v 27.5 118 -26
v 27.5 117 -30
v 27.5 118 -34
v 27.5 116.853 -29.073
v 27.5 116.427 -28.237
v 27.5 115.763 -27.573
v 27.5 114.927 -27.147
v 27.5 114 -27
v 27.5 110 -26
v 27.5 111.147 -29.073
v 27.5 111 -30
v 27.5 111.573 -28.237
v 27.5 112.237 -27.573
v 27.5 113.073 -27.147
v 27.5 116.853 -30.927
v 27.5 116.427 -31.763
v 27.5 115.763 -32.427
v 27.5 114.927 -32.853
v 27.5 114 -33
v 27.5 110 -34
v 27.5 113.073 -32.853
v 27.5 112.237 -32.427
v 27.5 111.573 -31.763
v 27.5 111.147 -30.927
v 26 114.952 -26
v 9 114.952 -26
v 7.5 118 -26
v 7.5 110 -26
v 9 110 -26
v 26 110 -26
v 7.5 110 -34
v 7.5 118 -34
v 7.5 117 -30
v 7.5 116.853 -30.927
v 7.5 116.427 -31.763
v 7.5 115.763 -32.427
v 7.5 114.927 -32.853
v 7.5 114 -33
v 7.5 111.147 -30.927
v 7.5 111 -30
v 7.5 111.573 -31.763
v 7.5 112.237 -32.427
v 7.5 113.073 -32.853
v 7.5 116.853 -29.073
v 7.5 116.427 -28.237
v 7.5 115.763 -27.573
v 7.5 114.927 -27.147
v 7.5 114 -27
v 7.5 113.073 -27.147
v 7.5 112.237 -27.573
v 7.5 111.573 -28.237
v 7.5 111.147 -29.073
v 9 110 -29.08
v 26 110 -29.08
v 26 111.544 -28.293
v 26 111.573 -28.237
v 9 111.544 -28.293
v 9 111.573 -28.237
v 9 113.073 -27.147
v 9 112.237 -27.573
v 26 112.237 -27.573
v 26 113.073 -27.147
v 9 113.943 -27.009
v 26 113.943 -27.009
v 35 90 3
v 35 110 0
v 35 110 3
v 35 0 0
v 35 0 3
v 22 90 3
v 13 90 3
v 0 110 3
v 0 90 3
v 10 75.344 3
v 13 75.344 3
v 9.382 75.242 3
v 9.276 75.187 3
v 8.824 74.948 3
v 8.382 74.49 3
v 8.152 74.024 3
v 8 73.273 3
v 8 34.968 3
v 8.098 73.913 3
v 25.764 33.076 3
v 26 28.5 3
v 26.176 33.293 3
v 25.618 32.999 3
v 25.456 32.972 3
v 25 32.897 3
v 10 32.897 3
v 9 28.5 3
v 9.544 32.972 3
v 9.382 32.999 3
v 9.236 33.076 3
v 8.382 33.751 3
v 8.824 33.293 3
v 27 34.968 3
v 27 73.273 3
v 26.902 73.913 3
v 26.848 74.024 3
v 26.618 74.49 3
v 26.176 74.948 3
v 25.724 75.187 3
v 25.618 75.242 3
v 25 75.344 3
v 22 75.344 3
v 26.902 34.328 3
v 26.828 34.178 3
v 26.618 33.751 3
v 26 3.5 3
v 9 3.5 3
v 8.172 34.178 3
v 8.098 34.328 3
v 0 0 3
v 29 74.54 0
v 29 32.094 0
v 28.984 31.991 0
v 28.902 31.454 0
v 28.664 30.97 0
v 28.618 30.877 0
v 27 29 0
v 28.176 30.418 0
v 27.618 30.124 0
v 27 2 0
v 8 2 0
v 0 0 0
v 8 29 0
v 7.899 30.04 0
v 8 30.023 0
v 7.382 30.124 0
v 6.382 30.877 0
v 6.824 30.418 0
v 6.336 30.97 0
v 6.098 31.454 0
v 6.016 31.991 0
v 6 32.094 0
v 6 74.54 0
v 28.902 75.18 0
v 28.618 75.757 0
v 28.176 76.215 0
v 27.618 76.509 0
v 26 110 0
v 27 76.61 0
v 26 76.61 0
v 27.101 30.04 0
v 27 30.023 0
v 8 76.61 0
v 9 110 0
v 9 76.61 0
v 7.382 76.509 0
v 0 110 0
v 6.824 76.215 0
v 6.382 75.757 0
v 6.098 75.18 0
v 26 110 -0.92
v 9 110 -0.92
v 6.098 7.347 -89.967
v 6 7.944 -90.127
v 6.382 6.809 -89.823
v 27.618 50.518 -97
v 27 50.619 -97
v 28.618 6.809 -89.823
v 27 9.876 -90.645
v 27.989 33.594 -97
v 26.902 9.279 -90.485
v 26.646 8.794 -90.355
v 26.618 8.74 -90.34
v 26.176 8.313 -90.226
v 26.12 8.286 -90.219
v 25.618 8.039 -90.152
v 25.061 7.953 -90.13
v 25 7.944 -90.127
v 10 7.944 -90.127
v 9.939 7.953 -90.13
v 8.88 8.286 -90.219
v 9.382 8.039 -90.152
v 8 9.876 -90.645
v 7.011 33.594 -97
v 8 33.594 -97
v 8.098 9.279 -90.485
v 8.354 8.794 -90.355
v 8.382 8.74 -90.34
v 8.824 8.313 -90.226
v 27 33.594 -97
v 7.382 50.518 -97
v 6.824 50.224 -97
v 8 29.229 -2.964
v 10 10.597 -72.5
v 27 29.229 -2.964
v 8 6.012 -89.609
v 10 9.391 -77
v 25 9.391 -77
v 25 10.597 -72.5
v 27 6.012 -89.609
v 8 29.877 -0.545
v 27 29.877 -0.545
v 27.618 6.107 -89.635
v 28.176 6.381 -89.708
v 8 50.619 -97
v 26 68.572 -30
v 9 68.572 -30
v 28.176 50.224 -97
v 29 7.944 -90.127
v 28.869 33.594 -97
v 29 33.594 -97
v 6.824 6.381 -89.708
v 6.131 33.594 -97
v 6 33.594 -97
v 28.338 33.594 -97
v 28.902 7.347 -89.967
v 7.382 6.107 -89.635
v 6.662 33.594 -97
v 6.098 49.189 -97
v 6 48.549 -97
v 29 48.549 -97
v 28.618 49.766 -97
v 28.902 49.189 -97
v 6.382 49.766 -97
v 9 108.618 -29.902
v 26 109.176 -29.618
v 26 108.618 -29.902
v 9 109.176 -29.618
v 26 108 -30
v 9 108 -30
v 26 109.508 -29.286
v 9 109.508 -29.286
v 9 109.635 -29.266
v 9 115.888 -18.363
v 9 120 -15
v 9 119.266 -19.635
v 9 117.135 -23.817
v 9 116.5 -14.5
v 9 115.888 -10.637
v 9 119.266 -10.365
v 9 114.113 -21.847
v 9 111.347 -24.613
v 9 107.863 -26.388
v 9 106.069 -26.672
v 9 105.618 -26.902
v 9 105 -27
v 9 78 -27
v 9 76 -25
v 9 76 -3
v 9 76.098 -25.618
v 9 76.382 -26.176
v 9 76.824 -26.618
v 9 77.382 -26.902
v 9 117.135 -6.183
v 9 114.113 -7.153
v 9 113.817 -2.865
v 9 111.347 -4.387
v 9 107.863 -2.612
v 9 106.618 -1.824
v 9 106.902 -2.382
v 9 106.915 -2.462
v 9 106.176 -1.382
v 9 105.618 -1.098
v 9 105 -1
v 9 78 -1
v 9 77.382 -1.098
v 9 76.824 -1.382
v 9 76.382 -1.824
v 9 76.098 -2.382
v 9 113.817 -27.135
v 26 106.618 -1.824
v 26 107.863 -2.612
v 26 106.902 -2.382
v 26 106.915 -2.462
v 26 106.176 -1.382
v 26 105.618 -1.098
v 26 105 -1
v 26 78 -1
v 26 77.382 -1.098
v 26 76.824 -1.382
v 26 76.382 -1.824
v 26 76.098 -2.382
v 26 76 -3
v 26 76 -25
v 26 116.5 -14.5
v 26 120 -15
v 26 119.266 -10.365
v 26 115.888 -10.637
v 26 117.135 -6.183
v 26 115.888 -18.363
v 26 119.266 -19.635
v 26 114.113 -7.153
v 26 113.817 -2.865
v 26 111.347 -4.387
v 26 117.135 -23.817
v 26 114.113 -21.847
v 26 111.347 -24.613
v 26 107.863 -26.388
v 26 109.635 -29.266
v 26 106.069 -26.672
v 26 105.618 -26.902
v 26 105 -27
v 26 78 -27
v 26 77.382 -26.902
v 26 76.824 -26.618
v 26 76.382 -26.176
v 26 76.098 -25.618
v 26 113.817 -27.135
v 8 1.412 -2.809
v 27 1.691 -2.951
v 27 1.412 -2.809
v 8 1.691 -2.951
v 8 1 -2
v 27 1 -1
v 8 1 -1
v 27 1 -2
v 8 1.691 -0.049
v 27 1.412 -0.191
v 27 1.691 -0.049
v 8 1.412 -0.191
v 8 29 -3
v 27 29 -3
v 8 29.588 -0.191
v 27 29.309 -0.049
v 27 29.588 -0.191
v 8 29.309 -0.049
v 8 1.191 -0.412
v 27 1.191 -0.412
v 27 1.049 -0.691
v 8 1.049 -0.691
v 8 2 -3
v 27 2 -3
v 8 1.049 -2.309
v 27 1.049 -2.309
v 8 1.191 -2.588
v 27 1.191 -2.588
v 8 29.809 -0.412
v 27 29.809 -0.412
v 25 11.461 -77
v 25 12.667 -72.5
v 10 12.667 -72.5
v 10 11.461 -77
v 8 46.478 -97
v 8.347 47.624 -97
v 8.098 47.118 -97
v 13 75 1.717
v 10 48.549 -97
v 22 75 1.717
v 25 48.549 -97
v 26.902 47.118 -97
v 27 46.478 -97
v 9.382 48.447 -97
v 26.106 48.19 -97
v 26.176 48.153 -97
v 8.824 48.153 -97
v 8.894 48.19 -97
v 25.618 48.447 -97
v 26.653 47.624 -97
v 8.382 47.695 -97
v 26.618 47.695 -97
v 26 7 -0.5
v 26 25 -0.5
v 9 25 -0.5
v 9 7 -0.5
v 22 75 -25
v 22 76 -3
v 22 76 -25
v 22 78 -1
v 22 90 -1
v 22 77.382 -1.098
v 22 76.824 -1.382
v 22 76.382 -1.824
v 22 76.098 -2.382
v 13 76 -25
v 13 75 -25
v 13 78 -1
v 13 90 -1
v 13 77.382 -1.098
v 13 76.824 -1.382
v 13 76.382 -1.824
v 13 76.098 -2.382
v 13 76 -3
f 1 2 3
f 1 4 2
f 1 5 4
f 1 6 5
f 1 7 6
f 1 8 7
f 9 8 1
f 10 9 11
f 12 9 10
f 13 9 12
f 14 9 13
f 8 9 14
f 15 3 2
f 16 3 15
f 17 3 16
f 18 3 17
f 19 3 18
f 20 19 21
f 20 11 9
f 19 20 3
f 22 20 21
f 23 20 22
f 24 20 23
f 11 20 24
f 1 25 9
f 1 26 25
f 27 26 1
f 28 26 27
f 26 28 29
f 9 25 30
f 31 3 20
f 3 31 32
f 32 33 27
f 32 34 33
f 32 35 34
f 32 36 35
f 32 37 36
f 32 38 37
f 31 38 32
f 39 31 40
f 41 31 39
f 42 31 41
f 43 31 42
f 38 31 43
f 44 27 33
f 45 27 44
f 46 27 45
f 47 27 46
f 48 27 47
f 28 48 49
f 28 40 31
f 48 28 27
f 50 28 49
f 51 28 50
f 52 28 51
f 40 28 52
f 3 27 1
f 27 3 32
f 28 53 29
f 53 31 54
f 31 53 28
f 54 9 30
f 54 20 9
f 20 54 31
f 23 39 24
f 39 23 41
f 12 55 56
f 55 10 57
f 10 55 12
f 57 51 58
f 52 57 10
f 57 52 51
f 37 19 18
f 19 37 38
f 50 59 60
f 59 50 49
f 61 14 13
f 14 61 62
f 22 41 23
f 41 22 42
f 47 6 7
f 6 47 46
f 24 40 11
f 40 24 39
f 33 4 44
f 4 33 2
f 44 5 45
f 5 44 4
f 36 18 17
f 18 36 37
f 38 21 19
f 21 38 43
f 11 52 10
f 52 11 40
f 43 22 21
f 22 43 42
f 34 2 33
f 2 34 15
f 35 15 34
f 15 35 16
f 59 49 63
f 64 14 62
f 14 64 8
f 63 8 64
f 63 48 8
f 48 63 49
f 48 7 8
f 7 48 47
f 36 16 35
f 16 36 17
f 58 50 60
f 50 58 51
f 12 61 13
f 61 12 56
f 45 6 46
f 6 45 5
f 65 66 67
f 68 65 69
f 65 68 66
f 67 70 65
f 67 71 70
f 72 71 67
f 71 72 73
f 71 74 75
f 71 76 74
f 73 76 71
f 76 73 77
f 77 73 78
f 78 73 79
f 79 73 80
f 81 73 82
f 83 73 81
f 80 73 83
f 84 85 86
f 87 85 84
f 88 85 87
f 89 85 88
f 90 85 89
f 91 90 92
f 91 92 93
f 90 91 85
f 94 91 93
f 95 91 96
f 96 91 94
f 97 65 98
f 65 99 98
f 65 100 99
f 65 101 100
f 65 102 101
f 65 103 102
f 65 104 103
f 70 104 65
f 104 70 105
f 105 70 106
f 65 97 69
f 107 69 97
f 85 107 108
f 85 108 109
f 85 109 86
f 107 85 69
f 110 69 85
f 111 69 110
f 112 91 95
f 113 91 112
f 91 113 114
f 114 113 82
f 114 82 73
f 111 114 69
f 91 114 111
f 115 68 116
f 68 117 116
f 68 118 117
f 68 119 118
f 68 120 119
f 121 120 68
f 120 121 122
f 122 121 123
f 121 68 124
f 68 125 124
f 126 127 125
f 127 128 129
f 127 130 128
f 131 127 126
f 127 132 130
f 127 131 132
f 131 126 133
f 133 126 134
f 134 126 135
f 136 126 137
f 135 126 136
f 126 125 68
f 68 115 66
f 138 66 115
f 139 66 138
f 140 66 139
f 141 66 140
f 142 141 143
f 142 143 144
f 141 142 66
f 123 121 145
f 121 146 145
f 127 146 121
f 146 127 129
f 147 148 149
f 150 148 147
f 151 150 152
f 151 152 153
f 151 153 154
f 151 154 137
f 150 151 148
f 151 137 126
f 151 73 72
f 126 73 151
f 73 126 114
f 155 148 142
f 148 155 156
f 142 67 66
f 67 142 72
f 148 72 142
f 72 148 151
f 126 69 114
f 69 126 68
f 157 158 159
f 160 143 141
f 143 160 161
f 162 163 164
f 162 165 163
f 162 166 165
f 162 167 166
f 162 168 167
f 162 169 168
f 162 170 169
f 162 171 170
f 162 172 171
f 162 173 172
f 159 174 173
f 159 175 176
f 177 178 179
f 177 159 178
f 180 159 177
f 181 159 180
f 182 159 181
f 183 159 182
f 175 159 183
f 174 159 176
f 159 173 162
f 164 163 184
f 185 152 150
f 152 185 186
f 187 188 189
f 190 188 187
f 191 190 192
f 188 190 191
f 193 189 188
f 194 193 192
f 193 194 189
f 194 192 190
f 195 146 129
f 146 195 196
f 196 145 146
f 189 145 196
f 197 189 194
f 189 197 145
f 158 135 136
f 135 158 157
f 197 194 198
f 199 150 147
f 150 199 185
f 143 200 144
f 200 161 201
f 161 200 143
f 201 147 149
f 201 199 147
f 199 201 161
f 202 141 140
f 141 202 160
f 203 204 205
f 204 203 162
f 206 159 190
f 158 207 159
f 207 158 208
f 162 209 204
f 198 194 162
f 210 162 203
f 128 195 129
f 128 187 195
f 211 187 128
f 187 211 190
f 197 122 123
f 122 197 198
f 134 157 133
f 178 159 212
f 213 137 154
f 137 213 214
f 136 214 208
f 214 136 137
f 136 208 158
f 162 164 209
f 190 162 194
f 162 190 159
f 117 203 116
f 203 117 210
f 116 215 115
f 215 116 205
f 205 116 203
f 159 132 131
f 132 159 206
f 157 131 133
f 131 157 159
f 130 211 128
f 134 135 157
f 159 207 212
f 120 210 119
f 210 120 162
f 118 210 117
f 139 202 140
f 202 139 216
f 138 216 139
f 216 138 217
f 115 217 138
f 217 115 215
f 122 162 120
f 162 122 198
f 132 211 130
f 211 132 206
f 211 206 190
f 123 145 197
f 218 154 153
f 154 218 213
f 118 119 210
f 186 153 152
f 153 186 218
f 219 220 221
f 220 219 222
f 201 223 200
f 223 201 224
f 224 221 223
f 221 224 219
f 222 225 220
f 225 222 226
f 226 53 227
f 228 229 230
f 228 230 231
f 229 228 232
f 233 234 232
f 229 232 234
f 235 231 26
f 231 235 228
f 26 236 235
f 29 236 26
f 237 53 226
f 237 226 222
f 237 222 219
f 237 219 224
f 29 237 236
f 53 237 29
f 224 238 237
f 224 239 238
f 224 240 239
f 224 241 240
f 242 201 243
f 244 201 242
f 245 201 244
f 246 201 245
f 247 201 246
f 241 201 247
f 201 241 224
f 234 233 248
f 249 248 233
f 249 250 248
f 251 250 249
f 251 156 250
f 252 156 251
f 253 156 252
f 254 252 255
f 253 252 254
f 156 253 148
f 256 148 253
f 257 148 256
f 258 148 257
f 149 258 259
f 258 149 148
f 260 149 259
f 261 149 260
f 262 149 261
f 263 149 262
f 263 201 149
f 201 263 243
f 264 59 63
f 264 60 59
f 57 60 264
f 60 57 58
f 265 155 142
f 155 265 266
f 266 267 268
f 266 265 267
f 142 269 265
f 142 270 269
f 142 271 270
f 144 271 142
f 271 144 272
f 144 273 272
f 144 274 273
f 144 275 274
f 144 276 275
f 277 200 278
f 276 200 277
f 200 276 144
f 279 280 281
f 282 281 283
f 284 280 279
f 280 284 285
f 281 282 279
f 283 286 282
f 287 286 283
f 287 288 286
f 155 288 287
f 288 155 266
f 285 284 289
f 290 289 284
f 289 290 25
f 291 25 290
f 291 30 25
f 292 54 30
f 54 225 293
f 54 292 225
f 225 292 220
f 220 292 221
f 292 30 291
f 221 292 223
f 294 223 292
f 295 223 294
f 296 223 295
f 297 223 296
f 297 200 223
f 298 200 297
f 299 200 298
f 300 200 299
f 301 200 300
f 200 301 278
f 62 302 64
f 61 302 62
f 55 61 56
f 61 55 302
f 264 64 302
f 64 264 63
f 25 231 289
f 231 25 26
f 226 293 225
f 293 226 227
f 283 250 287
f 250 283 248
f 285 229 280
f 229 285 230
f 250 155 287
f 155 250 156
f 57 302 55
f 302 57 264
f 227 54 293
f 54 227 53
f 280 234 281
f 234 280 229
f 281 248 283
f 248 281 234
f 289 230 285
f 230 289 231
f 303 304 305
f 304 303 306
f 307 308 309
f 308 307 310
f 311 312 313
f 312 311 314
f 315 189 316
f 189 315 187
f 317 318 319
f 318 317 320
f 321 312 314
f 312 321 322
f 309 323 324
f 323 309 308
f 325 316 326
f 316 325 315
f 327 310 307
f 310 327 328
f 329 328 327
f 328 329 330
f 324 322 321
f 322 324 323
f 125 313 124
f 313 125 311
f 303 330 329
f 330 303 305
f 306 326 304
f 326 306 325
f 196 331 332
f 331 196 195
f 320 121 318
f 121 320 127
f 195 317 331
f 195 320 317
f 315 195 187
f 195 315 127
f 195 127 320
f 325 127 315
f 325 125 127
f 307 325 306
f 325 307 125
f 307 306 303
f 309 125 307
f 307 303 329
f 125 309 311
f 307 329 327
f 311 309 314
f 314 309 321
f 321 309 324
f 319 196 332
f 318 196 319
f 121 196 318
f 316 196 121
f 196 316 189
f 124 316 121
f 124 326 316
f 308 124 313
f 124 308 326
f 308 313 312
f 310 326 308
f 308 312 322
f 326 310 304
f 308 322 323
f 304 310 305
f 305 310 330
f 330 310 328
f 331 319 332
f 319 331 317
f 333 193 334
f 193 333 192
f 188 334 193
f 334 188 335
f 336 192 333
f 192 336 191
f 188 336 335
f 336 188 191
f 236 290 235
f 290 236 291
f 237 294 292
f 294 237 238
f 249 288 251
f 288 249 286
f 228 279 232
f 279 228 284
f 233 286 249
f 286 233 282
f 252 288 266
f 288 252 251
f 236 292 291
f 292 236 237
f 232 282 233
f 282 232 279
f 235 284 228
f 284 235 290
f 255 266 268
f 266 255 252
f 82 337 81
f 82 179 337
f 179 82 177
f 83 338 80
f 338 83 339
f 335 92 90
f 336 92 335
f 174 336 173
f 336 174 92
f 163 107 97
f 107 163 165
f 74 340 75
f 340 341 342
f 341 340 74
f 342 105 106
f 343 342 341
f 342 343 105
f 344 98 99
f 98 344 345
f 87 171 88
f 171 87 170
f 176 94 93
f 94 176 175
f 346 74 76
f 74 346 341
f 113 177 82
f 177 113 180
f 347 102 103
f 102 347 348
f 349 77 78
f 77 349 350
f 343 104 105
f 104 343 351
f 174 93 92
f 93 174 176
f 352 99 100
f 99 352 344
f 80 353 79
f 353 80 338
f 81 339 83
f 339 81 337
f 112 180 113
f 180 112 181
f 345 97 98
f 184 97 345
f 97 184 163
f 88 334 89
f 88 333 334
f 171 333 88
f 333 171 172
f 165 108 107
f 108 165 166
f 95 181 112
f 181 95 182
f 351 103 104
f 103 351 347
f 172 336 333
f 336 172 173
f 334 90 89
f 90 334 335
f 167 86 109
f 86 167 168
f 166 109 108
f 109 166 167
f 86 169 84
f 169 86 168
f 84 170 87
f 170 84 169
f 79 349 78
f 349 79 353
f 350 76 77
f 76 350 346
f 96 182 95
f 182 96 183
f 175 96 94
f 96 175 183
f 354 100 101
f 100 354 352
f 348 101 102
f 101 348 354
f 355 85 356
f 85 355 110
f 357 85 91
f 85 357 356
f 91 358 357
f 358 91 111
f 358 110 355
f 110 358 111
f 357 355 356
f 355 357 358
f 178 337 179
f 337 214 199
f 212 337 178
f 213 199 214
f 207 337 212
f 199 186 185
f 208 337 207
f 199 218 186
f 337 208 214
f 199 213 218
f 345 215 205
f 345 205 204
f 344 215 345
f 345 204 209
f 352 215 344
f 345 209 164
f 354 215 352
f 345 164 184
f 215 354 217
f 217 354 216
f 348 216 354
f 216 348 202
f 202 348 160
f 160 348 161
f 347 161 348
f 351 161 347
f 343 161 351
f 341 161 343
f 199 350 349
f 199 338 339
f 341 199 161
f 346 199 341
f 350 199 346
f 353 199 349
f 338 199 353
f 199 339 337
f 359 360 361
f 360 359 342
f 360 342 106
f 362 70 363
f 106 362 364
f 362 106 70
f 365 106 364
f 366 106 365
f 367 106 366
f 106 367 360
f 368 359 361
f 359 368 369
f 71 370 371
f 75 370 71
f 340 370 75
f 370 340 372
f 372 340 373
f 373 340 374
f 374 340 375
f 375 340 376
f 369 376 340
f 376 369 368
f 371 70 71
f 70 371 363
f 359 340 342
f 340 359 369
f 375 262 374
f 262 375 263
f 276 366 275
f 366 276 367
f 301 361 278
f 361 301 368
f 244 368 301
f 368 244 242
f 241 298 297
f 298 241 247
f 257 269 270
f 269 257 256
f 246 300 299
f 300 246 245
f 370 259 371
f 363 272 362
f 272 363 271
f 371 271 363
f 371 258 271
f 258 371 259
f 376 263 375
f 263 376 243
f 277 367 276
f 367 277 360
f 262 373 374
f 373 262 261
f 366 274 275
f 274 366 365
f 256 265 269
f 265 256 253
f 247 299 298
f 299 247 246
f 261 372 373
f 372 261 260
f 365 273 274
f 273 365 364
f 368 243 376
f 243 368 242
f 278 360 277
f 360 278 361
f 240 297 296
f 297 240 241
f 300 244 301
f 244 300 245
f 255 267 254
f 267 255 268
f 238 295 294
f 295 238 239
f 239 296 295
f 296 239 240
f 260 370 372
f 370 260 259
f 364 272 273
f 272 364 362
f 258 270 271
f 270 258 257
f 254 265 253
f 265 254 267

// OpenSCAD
$fn=20;   // For persion of polygons


difference(){
union(){
difference(){ // the period
translate([7.5,110,-34]){ // the period
    cube([20,8,8]);
}
translate([0,114,-30]){
rotate([0,90,0]){
  cylinder(r=3,h=30);
}}}
cube([35,110,3]);  //lower plate.
rotate([-15,0,0]){ // handle.
translate([8,31,-85]){
minkowski(){
  cube([19,41,110]);
  cylinder(r=2,h=1);
}}}
rotate([0,90,0]){ // triggerguard.
translate([0,67,9]){
minkowski(){
  cube([28,41,16]);
  cylinder(r=2,h=1);
}}}
translate([9,105,-15]){ // extra finger space.
rotate([0,90,0]){
  cylinder(r=15,h=17);
}}
rotate([0,90,0]){ // backstrap.
translate([1,2,8]){
minkowski(){
  cube([1,27,18]);
  cylinder(r=1,h=1);
}}}
}


translate([10,-7,-77]){ // clip notch
    cube([15,25,4.5]);
}


translate([7,104,-14.5]){ // extra finger hole
rotate([0,90,0]){
  cylinder(r=12.5,h=22);
}}
rotate([-15,0,0]){  // clip grove
translate([10,33,-100]){
minkowski(){
  cube([15,37,150]);
  cylinder(r=2,h=1);
}}}

hull(){   //  ramp path
translate([-1,2,2.5]){
difference(){   //ramp
translate([10,5,-3]){
rotate([45,0,0]){
    cube([17,5,5]);
}}
translate([9,0,2]){
    cube([20,30,5]);
}}}
translate([-1,20,2.5]){
difference(){   //ramp
translate([10,5,-3]){
rotate([45,0,0]){
    cube([17,5,5]);
}}
translate([9,0,2]){
    cube([20,30,5]);
}}}}

translate([-10,-10,-112]){  // trim handle top
  cube([100,100,15]);
}
translate([-10,-10,3]){  // trim handle bottom
  cube([100,100,15]);
}
translate([13,75,-25]){ // trigger grove
  cube([9,15,30]);
}
rotate([0,90,0]){ // triggerguard hole.
translate([3,78,-5]){
minkowski(){
  cube([22,27,50]);
  cylinder(r=2,h=1);
}}}

}
